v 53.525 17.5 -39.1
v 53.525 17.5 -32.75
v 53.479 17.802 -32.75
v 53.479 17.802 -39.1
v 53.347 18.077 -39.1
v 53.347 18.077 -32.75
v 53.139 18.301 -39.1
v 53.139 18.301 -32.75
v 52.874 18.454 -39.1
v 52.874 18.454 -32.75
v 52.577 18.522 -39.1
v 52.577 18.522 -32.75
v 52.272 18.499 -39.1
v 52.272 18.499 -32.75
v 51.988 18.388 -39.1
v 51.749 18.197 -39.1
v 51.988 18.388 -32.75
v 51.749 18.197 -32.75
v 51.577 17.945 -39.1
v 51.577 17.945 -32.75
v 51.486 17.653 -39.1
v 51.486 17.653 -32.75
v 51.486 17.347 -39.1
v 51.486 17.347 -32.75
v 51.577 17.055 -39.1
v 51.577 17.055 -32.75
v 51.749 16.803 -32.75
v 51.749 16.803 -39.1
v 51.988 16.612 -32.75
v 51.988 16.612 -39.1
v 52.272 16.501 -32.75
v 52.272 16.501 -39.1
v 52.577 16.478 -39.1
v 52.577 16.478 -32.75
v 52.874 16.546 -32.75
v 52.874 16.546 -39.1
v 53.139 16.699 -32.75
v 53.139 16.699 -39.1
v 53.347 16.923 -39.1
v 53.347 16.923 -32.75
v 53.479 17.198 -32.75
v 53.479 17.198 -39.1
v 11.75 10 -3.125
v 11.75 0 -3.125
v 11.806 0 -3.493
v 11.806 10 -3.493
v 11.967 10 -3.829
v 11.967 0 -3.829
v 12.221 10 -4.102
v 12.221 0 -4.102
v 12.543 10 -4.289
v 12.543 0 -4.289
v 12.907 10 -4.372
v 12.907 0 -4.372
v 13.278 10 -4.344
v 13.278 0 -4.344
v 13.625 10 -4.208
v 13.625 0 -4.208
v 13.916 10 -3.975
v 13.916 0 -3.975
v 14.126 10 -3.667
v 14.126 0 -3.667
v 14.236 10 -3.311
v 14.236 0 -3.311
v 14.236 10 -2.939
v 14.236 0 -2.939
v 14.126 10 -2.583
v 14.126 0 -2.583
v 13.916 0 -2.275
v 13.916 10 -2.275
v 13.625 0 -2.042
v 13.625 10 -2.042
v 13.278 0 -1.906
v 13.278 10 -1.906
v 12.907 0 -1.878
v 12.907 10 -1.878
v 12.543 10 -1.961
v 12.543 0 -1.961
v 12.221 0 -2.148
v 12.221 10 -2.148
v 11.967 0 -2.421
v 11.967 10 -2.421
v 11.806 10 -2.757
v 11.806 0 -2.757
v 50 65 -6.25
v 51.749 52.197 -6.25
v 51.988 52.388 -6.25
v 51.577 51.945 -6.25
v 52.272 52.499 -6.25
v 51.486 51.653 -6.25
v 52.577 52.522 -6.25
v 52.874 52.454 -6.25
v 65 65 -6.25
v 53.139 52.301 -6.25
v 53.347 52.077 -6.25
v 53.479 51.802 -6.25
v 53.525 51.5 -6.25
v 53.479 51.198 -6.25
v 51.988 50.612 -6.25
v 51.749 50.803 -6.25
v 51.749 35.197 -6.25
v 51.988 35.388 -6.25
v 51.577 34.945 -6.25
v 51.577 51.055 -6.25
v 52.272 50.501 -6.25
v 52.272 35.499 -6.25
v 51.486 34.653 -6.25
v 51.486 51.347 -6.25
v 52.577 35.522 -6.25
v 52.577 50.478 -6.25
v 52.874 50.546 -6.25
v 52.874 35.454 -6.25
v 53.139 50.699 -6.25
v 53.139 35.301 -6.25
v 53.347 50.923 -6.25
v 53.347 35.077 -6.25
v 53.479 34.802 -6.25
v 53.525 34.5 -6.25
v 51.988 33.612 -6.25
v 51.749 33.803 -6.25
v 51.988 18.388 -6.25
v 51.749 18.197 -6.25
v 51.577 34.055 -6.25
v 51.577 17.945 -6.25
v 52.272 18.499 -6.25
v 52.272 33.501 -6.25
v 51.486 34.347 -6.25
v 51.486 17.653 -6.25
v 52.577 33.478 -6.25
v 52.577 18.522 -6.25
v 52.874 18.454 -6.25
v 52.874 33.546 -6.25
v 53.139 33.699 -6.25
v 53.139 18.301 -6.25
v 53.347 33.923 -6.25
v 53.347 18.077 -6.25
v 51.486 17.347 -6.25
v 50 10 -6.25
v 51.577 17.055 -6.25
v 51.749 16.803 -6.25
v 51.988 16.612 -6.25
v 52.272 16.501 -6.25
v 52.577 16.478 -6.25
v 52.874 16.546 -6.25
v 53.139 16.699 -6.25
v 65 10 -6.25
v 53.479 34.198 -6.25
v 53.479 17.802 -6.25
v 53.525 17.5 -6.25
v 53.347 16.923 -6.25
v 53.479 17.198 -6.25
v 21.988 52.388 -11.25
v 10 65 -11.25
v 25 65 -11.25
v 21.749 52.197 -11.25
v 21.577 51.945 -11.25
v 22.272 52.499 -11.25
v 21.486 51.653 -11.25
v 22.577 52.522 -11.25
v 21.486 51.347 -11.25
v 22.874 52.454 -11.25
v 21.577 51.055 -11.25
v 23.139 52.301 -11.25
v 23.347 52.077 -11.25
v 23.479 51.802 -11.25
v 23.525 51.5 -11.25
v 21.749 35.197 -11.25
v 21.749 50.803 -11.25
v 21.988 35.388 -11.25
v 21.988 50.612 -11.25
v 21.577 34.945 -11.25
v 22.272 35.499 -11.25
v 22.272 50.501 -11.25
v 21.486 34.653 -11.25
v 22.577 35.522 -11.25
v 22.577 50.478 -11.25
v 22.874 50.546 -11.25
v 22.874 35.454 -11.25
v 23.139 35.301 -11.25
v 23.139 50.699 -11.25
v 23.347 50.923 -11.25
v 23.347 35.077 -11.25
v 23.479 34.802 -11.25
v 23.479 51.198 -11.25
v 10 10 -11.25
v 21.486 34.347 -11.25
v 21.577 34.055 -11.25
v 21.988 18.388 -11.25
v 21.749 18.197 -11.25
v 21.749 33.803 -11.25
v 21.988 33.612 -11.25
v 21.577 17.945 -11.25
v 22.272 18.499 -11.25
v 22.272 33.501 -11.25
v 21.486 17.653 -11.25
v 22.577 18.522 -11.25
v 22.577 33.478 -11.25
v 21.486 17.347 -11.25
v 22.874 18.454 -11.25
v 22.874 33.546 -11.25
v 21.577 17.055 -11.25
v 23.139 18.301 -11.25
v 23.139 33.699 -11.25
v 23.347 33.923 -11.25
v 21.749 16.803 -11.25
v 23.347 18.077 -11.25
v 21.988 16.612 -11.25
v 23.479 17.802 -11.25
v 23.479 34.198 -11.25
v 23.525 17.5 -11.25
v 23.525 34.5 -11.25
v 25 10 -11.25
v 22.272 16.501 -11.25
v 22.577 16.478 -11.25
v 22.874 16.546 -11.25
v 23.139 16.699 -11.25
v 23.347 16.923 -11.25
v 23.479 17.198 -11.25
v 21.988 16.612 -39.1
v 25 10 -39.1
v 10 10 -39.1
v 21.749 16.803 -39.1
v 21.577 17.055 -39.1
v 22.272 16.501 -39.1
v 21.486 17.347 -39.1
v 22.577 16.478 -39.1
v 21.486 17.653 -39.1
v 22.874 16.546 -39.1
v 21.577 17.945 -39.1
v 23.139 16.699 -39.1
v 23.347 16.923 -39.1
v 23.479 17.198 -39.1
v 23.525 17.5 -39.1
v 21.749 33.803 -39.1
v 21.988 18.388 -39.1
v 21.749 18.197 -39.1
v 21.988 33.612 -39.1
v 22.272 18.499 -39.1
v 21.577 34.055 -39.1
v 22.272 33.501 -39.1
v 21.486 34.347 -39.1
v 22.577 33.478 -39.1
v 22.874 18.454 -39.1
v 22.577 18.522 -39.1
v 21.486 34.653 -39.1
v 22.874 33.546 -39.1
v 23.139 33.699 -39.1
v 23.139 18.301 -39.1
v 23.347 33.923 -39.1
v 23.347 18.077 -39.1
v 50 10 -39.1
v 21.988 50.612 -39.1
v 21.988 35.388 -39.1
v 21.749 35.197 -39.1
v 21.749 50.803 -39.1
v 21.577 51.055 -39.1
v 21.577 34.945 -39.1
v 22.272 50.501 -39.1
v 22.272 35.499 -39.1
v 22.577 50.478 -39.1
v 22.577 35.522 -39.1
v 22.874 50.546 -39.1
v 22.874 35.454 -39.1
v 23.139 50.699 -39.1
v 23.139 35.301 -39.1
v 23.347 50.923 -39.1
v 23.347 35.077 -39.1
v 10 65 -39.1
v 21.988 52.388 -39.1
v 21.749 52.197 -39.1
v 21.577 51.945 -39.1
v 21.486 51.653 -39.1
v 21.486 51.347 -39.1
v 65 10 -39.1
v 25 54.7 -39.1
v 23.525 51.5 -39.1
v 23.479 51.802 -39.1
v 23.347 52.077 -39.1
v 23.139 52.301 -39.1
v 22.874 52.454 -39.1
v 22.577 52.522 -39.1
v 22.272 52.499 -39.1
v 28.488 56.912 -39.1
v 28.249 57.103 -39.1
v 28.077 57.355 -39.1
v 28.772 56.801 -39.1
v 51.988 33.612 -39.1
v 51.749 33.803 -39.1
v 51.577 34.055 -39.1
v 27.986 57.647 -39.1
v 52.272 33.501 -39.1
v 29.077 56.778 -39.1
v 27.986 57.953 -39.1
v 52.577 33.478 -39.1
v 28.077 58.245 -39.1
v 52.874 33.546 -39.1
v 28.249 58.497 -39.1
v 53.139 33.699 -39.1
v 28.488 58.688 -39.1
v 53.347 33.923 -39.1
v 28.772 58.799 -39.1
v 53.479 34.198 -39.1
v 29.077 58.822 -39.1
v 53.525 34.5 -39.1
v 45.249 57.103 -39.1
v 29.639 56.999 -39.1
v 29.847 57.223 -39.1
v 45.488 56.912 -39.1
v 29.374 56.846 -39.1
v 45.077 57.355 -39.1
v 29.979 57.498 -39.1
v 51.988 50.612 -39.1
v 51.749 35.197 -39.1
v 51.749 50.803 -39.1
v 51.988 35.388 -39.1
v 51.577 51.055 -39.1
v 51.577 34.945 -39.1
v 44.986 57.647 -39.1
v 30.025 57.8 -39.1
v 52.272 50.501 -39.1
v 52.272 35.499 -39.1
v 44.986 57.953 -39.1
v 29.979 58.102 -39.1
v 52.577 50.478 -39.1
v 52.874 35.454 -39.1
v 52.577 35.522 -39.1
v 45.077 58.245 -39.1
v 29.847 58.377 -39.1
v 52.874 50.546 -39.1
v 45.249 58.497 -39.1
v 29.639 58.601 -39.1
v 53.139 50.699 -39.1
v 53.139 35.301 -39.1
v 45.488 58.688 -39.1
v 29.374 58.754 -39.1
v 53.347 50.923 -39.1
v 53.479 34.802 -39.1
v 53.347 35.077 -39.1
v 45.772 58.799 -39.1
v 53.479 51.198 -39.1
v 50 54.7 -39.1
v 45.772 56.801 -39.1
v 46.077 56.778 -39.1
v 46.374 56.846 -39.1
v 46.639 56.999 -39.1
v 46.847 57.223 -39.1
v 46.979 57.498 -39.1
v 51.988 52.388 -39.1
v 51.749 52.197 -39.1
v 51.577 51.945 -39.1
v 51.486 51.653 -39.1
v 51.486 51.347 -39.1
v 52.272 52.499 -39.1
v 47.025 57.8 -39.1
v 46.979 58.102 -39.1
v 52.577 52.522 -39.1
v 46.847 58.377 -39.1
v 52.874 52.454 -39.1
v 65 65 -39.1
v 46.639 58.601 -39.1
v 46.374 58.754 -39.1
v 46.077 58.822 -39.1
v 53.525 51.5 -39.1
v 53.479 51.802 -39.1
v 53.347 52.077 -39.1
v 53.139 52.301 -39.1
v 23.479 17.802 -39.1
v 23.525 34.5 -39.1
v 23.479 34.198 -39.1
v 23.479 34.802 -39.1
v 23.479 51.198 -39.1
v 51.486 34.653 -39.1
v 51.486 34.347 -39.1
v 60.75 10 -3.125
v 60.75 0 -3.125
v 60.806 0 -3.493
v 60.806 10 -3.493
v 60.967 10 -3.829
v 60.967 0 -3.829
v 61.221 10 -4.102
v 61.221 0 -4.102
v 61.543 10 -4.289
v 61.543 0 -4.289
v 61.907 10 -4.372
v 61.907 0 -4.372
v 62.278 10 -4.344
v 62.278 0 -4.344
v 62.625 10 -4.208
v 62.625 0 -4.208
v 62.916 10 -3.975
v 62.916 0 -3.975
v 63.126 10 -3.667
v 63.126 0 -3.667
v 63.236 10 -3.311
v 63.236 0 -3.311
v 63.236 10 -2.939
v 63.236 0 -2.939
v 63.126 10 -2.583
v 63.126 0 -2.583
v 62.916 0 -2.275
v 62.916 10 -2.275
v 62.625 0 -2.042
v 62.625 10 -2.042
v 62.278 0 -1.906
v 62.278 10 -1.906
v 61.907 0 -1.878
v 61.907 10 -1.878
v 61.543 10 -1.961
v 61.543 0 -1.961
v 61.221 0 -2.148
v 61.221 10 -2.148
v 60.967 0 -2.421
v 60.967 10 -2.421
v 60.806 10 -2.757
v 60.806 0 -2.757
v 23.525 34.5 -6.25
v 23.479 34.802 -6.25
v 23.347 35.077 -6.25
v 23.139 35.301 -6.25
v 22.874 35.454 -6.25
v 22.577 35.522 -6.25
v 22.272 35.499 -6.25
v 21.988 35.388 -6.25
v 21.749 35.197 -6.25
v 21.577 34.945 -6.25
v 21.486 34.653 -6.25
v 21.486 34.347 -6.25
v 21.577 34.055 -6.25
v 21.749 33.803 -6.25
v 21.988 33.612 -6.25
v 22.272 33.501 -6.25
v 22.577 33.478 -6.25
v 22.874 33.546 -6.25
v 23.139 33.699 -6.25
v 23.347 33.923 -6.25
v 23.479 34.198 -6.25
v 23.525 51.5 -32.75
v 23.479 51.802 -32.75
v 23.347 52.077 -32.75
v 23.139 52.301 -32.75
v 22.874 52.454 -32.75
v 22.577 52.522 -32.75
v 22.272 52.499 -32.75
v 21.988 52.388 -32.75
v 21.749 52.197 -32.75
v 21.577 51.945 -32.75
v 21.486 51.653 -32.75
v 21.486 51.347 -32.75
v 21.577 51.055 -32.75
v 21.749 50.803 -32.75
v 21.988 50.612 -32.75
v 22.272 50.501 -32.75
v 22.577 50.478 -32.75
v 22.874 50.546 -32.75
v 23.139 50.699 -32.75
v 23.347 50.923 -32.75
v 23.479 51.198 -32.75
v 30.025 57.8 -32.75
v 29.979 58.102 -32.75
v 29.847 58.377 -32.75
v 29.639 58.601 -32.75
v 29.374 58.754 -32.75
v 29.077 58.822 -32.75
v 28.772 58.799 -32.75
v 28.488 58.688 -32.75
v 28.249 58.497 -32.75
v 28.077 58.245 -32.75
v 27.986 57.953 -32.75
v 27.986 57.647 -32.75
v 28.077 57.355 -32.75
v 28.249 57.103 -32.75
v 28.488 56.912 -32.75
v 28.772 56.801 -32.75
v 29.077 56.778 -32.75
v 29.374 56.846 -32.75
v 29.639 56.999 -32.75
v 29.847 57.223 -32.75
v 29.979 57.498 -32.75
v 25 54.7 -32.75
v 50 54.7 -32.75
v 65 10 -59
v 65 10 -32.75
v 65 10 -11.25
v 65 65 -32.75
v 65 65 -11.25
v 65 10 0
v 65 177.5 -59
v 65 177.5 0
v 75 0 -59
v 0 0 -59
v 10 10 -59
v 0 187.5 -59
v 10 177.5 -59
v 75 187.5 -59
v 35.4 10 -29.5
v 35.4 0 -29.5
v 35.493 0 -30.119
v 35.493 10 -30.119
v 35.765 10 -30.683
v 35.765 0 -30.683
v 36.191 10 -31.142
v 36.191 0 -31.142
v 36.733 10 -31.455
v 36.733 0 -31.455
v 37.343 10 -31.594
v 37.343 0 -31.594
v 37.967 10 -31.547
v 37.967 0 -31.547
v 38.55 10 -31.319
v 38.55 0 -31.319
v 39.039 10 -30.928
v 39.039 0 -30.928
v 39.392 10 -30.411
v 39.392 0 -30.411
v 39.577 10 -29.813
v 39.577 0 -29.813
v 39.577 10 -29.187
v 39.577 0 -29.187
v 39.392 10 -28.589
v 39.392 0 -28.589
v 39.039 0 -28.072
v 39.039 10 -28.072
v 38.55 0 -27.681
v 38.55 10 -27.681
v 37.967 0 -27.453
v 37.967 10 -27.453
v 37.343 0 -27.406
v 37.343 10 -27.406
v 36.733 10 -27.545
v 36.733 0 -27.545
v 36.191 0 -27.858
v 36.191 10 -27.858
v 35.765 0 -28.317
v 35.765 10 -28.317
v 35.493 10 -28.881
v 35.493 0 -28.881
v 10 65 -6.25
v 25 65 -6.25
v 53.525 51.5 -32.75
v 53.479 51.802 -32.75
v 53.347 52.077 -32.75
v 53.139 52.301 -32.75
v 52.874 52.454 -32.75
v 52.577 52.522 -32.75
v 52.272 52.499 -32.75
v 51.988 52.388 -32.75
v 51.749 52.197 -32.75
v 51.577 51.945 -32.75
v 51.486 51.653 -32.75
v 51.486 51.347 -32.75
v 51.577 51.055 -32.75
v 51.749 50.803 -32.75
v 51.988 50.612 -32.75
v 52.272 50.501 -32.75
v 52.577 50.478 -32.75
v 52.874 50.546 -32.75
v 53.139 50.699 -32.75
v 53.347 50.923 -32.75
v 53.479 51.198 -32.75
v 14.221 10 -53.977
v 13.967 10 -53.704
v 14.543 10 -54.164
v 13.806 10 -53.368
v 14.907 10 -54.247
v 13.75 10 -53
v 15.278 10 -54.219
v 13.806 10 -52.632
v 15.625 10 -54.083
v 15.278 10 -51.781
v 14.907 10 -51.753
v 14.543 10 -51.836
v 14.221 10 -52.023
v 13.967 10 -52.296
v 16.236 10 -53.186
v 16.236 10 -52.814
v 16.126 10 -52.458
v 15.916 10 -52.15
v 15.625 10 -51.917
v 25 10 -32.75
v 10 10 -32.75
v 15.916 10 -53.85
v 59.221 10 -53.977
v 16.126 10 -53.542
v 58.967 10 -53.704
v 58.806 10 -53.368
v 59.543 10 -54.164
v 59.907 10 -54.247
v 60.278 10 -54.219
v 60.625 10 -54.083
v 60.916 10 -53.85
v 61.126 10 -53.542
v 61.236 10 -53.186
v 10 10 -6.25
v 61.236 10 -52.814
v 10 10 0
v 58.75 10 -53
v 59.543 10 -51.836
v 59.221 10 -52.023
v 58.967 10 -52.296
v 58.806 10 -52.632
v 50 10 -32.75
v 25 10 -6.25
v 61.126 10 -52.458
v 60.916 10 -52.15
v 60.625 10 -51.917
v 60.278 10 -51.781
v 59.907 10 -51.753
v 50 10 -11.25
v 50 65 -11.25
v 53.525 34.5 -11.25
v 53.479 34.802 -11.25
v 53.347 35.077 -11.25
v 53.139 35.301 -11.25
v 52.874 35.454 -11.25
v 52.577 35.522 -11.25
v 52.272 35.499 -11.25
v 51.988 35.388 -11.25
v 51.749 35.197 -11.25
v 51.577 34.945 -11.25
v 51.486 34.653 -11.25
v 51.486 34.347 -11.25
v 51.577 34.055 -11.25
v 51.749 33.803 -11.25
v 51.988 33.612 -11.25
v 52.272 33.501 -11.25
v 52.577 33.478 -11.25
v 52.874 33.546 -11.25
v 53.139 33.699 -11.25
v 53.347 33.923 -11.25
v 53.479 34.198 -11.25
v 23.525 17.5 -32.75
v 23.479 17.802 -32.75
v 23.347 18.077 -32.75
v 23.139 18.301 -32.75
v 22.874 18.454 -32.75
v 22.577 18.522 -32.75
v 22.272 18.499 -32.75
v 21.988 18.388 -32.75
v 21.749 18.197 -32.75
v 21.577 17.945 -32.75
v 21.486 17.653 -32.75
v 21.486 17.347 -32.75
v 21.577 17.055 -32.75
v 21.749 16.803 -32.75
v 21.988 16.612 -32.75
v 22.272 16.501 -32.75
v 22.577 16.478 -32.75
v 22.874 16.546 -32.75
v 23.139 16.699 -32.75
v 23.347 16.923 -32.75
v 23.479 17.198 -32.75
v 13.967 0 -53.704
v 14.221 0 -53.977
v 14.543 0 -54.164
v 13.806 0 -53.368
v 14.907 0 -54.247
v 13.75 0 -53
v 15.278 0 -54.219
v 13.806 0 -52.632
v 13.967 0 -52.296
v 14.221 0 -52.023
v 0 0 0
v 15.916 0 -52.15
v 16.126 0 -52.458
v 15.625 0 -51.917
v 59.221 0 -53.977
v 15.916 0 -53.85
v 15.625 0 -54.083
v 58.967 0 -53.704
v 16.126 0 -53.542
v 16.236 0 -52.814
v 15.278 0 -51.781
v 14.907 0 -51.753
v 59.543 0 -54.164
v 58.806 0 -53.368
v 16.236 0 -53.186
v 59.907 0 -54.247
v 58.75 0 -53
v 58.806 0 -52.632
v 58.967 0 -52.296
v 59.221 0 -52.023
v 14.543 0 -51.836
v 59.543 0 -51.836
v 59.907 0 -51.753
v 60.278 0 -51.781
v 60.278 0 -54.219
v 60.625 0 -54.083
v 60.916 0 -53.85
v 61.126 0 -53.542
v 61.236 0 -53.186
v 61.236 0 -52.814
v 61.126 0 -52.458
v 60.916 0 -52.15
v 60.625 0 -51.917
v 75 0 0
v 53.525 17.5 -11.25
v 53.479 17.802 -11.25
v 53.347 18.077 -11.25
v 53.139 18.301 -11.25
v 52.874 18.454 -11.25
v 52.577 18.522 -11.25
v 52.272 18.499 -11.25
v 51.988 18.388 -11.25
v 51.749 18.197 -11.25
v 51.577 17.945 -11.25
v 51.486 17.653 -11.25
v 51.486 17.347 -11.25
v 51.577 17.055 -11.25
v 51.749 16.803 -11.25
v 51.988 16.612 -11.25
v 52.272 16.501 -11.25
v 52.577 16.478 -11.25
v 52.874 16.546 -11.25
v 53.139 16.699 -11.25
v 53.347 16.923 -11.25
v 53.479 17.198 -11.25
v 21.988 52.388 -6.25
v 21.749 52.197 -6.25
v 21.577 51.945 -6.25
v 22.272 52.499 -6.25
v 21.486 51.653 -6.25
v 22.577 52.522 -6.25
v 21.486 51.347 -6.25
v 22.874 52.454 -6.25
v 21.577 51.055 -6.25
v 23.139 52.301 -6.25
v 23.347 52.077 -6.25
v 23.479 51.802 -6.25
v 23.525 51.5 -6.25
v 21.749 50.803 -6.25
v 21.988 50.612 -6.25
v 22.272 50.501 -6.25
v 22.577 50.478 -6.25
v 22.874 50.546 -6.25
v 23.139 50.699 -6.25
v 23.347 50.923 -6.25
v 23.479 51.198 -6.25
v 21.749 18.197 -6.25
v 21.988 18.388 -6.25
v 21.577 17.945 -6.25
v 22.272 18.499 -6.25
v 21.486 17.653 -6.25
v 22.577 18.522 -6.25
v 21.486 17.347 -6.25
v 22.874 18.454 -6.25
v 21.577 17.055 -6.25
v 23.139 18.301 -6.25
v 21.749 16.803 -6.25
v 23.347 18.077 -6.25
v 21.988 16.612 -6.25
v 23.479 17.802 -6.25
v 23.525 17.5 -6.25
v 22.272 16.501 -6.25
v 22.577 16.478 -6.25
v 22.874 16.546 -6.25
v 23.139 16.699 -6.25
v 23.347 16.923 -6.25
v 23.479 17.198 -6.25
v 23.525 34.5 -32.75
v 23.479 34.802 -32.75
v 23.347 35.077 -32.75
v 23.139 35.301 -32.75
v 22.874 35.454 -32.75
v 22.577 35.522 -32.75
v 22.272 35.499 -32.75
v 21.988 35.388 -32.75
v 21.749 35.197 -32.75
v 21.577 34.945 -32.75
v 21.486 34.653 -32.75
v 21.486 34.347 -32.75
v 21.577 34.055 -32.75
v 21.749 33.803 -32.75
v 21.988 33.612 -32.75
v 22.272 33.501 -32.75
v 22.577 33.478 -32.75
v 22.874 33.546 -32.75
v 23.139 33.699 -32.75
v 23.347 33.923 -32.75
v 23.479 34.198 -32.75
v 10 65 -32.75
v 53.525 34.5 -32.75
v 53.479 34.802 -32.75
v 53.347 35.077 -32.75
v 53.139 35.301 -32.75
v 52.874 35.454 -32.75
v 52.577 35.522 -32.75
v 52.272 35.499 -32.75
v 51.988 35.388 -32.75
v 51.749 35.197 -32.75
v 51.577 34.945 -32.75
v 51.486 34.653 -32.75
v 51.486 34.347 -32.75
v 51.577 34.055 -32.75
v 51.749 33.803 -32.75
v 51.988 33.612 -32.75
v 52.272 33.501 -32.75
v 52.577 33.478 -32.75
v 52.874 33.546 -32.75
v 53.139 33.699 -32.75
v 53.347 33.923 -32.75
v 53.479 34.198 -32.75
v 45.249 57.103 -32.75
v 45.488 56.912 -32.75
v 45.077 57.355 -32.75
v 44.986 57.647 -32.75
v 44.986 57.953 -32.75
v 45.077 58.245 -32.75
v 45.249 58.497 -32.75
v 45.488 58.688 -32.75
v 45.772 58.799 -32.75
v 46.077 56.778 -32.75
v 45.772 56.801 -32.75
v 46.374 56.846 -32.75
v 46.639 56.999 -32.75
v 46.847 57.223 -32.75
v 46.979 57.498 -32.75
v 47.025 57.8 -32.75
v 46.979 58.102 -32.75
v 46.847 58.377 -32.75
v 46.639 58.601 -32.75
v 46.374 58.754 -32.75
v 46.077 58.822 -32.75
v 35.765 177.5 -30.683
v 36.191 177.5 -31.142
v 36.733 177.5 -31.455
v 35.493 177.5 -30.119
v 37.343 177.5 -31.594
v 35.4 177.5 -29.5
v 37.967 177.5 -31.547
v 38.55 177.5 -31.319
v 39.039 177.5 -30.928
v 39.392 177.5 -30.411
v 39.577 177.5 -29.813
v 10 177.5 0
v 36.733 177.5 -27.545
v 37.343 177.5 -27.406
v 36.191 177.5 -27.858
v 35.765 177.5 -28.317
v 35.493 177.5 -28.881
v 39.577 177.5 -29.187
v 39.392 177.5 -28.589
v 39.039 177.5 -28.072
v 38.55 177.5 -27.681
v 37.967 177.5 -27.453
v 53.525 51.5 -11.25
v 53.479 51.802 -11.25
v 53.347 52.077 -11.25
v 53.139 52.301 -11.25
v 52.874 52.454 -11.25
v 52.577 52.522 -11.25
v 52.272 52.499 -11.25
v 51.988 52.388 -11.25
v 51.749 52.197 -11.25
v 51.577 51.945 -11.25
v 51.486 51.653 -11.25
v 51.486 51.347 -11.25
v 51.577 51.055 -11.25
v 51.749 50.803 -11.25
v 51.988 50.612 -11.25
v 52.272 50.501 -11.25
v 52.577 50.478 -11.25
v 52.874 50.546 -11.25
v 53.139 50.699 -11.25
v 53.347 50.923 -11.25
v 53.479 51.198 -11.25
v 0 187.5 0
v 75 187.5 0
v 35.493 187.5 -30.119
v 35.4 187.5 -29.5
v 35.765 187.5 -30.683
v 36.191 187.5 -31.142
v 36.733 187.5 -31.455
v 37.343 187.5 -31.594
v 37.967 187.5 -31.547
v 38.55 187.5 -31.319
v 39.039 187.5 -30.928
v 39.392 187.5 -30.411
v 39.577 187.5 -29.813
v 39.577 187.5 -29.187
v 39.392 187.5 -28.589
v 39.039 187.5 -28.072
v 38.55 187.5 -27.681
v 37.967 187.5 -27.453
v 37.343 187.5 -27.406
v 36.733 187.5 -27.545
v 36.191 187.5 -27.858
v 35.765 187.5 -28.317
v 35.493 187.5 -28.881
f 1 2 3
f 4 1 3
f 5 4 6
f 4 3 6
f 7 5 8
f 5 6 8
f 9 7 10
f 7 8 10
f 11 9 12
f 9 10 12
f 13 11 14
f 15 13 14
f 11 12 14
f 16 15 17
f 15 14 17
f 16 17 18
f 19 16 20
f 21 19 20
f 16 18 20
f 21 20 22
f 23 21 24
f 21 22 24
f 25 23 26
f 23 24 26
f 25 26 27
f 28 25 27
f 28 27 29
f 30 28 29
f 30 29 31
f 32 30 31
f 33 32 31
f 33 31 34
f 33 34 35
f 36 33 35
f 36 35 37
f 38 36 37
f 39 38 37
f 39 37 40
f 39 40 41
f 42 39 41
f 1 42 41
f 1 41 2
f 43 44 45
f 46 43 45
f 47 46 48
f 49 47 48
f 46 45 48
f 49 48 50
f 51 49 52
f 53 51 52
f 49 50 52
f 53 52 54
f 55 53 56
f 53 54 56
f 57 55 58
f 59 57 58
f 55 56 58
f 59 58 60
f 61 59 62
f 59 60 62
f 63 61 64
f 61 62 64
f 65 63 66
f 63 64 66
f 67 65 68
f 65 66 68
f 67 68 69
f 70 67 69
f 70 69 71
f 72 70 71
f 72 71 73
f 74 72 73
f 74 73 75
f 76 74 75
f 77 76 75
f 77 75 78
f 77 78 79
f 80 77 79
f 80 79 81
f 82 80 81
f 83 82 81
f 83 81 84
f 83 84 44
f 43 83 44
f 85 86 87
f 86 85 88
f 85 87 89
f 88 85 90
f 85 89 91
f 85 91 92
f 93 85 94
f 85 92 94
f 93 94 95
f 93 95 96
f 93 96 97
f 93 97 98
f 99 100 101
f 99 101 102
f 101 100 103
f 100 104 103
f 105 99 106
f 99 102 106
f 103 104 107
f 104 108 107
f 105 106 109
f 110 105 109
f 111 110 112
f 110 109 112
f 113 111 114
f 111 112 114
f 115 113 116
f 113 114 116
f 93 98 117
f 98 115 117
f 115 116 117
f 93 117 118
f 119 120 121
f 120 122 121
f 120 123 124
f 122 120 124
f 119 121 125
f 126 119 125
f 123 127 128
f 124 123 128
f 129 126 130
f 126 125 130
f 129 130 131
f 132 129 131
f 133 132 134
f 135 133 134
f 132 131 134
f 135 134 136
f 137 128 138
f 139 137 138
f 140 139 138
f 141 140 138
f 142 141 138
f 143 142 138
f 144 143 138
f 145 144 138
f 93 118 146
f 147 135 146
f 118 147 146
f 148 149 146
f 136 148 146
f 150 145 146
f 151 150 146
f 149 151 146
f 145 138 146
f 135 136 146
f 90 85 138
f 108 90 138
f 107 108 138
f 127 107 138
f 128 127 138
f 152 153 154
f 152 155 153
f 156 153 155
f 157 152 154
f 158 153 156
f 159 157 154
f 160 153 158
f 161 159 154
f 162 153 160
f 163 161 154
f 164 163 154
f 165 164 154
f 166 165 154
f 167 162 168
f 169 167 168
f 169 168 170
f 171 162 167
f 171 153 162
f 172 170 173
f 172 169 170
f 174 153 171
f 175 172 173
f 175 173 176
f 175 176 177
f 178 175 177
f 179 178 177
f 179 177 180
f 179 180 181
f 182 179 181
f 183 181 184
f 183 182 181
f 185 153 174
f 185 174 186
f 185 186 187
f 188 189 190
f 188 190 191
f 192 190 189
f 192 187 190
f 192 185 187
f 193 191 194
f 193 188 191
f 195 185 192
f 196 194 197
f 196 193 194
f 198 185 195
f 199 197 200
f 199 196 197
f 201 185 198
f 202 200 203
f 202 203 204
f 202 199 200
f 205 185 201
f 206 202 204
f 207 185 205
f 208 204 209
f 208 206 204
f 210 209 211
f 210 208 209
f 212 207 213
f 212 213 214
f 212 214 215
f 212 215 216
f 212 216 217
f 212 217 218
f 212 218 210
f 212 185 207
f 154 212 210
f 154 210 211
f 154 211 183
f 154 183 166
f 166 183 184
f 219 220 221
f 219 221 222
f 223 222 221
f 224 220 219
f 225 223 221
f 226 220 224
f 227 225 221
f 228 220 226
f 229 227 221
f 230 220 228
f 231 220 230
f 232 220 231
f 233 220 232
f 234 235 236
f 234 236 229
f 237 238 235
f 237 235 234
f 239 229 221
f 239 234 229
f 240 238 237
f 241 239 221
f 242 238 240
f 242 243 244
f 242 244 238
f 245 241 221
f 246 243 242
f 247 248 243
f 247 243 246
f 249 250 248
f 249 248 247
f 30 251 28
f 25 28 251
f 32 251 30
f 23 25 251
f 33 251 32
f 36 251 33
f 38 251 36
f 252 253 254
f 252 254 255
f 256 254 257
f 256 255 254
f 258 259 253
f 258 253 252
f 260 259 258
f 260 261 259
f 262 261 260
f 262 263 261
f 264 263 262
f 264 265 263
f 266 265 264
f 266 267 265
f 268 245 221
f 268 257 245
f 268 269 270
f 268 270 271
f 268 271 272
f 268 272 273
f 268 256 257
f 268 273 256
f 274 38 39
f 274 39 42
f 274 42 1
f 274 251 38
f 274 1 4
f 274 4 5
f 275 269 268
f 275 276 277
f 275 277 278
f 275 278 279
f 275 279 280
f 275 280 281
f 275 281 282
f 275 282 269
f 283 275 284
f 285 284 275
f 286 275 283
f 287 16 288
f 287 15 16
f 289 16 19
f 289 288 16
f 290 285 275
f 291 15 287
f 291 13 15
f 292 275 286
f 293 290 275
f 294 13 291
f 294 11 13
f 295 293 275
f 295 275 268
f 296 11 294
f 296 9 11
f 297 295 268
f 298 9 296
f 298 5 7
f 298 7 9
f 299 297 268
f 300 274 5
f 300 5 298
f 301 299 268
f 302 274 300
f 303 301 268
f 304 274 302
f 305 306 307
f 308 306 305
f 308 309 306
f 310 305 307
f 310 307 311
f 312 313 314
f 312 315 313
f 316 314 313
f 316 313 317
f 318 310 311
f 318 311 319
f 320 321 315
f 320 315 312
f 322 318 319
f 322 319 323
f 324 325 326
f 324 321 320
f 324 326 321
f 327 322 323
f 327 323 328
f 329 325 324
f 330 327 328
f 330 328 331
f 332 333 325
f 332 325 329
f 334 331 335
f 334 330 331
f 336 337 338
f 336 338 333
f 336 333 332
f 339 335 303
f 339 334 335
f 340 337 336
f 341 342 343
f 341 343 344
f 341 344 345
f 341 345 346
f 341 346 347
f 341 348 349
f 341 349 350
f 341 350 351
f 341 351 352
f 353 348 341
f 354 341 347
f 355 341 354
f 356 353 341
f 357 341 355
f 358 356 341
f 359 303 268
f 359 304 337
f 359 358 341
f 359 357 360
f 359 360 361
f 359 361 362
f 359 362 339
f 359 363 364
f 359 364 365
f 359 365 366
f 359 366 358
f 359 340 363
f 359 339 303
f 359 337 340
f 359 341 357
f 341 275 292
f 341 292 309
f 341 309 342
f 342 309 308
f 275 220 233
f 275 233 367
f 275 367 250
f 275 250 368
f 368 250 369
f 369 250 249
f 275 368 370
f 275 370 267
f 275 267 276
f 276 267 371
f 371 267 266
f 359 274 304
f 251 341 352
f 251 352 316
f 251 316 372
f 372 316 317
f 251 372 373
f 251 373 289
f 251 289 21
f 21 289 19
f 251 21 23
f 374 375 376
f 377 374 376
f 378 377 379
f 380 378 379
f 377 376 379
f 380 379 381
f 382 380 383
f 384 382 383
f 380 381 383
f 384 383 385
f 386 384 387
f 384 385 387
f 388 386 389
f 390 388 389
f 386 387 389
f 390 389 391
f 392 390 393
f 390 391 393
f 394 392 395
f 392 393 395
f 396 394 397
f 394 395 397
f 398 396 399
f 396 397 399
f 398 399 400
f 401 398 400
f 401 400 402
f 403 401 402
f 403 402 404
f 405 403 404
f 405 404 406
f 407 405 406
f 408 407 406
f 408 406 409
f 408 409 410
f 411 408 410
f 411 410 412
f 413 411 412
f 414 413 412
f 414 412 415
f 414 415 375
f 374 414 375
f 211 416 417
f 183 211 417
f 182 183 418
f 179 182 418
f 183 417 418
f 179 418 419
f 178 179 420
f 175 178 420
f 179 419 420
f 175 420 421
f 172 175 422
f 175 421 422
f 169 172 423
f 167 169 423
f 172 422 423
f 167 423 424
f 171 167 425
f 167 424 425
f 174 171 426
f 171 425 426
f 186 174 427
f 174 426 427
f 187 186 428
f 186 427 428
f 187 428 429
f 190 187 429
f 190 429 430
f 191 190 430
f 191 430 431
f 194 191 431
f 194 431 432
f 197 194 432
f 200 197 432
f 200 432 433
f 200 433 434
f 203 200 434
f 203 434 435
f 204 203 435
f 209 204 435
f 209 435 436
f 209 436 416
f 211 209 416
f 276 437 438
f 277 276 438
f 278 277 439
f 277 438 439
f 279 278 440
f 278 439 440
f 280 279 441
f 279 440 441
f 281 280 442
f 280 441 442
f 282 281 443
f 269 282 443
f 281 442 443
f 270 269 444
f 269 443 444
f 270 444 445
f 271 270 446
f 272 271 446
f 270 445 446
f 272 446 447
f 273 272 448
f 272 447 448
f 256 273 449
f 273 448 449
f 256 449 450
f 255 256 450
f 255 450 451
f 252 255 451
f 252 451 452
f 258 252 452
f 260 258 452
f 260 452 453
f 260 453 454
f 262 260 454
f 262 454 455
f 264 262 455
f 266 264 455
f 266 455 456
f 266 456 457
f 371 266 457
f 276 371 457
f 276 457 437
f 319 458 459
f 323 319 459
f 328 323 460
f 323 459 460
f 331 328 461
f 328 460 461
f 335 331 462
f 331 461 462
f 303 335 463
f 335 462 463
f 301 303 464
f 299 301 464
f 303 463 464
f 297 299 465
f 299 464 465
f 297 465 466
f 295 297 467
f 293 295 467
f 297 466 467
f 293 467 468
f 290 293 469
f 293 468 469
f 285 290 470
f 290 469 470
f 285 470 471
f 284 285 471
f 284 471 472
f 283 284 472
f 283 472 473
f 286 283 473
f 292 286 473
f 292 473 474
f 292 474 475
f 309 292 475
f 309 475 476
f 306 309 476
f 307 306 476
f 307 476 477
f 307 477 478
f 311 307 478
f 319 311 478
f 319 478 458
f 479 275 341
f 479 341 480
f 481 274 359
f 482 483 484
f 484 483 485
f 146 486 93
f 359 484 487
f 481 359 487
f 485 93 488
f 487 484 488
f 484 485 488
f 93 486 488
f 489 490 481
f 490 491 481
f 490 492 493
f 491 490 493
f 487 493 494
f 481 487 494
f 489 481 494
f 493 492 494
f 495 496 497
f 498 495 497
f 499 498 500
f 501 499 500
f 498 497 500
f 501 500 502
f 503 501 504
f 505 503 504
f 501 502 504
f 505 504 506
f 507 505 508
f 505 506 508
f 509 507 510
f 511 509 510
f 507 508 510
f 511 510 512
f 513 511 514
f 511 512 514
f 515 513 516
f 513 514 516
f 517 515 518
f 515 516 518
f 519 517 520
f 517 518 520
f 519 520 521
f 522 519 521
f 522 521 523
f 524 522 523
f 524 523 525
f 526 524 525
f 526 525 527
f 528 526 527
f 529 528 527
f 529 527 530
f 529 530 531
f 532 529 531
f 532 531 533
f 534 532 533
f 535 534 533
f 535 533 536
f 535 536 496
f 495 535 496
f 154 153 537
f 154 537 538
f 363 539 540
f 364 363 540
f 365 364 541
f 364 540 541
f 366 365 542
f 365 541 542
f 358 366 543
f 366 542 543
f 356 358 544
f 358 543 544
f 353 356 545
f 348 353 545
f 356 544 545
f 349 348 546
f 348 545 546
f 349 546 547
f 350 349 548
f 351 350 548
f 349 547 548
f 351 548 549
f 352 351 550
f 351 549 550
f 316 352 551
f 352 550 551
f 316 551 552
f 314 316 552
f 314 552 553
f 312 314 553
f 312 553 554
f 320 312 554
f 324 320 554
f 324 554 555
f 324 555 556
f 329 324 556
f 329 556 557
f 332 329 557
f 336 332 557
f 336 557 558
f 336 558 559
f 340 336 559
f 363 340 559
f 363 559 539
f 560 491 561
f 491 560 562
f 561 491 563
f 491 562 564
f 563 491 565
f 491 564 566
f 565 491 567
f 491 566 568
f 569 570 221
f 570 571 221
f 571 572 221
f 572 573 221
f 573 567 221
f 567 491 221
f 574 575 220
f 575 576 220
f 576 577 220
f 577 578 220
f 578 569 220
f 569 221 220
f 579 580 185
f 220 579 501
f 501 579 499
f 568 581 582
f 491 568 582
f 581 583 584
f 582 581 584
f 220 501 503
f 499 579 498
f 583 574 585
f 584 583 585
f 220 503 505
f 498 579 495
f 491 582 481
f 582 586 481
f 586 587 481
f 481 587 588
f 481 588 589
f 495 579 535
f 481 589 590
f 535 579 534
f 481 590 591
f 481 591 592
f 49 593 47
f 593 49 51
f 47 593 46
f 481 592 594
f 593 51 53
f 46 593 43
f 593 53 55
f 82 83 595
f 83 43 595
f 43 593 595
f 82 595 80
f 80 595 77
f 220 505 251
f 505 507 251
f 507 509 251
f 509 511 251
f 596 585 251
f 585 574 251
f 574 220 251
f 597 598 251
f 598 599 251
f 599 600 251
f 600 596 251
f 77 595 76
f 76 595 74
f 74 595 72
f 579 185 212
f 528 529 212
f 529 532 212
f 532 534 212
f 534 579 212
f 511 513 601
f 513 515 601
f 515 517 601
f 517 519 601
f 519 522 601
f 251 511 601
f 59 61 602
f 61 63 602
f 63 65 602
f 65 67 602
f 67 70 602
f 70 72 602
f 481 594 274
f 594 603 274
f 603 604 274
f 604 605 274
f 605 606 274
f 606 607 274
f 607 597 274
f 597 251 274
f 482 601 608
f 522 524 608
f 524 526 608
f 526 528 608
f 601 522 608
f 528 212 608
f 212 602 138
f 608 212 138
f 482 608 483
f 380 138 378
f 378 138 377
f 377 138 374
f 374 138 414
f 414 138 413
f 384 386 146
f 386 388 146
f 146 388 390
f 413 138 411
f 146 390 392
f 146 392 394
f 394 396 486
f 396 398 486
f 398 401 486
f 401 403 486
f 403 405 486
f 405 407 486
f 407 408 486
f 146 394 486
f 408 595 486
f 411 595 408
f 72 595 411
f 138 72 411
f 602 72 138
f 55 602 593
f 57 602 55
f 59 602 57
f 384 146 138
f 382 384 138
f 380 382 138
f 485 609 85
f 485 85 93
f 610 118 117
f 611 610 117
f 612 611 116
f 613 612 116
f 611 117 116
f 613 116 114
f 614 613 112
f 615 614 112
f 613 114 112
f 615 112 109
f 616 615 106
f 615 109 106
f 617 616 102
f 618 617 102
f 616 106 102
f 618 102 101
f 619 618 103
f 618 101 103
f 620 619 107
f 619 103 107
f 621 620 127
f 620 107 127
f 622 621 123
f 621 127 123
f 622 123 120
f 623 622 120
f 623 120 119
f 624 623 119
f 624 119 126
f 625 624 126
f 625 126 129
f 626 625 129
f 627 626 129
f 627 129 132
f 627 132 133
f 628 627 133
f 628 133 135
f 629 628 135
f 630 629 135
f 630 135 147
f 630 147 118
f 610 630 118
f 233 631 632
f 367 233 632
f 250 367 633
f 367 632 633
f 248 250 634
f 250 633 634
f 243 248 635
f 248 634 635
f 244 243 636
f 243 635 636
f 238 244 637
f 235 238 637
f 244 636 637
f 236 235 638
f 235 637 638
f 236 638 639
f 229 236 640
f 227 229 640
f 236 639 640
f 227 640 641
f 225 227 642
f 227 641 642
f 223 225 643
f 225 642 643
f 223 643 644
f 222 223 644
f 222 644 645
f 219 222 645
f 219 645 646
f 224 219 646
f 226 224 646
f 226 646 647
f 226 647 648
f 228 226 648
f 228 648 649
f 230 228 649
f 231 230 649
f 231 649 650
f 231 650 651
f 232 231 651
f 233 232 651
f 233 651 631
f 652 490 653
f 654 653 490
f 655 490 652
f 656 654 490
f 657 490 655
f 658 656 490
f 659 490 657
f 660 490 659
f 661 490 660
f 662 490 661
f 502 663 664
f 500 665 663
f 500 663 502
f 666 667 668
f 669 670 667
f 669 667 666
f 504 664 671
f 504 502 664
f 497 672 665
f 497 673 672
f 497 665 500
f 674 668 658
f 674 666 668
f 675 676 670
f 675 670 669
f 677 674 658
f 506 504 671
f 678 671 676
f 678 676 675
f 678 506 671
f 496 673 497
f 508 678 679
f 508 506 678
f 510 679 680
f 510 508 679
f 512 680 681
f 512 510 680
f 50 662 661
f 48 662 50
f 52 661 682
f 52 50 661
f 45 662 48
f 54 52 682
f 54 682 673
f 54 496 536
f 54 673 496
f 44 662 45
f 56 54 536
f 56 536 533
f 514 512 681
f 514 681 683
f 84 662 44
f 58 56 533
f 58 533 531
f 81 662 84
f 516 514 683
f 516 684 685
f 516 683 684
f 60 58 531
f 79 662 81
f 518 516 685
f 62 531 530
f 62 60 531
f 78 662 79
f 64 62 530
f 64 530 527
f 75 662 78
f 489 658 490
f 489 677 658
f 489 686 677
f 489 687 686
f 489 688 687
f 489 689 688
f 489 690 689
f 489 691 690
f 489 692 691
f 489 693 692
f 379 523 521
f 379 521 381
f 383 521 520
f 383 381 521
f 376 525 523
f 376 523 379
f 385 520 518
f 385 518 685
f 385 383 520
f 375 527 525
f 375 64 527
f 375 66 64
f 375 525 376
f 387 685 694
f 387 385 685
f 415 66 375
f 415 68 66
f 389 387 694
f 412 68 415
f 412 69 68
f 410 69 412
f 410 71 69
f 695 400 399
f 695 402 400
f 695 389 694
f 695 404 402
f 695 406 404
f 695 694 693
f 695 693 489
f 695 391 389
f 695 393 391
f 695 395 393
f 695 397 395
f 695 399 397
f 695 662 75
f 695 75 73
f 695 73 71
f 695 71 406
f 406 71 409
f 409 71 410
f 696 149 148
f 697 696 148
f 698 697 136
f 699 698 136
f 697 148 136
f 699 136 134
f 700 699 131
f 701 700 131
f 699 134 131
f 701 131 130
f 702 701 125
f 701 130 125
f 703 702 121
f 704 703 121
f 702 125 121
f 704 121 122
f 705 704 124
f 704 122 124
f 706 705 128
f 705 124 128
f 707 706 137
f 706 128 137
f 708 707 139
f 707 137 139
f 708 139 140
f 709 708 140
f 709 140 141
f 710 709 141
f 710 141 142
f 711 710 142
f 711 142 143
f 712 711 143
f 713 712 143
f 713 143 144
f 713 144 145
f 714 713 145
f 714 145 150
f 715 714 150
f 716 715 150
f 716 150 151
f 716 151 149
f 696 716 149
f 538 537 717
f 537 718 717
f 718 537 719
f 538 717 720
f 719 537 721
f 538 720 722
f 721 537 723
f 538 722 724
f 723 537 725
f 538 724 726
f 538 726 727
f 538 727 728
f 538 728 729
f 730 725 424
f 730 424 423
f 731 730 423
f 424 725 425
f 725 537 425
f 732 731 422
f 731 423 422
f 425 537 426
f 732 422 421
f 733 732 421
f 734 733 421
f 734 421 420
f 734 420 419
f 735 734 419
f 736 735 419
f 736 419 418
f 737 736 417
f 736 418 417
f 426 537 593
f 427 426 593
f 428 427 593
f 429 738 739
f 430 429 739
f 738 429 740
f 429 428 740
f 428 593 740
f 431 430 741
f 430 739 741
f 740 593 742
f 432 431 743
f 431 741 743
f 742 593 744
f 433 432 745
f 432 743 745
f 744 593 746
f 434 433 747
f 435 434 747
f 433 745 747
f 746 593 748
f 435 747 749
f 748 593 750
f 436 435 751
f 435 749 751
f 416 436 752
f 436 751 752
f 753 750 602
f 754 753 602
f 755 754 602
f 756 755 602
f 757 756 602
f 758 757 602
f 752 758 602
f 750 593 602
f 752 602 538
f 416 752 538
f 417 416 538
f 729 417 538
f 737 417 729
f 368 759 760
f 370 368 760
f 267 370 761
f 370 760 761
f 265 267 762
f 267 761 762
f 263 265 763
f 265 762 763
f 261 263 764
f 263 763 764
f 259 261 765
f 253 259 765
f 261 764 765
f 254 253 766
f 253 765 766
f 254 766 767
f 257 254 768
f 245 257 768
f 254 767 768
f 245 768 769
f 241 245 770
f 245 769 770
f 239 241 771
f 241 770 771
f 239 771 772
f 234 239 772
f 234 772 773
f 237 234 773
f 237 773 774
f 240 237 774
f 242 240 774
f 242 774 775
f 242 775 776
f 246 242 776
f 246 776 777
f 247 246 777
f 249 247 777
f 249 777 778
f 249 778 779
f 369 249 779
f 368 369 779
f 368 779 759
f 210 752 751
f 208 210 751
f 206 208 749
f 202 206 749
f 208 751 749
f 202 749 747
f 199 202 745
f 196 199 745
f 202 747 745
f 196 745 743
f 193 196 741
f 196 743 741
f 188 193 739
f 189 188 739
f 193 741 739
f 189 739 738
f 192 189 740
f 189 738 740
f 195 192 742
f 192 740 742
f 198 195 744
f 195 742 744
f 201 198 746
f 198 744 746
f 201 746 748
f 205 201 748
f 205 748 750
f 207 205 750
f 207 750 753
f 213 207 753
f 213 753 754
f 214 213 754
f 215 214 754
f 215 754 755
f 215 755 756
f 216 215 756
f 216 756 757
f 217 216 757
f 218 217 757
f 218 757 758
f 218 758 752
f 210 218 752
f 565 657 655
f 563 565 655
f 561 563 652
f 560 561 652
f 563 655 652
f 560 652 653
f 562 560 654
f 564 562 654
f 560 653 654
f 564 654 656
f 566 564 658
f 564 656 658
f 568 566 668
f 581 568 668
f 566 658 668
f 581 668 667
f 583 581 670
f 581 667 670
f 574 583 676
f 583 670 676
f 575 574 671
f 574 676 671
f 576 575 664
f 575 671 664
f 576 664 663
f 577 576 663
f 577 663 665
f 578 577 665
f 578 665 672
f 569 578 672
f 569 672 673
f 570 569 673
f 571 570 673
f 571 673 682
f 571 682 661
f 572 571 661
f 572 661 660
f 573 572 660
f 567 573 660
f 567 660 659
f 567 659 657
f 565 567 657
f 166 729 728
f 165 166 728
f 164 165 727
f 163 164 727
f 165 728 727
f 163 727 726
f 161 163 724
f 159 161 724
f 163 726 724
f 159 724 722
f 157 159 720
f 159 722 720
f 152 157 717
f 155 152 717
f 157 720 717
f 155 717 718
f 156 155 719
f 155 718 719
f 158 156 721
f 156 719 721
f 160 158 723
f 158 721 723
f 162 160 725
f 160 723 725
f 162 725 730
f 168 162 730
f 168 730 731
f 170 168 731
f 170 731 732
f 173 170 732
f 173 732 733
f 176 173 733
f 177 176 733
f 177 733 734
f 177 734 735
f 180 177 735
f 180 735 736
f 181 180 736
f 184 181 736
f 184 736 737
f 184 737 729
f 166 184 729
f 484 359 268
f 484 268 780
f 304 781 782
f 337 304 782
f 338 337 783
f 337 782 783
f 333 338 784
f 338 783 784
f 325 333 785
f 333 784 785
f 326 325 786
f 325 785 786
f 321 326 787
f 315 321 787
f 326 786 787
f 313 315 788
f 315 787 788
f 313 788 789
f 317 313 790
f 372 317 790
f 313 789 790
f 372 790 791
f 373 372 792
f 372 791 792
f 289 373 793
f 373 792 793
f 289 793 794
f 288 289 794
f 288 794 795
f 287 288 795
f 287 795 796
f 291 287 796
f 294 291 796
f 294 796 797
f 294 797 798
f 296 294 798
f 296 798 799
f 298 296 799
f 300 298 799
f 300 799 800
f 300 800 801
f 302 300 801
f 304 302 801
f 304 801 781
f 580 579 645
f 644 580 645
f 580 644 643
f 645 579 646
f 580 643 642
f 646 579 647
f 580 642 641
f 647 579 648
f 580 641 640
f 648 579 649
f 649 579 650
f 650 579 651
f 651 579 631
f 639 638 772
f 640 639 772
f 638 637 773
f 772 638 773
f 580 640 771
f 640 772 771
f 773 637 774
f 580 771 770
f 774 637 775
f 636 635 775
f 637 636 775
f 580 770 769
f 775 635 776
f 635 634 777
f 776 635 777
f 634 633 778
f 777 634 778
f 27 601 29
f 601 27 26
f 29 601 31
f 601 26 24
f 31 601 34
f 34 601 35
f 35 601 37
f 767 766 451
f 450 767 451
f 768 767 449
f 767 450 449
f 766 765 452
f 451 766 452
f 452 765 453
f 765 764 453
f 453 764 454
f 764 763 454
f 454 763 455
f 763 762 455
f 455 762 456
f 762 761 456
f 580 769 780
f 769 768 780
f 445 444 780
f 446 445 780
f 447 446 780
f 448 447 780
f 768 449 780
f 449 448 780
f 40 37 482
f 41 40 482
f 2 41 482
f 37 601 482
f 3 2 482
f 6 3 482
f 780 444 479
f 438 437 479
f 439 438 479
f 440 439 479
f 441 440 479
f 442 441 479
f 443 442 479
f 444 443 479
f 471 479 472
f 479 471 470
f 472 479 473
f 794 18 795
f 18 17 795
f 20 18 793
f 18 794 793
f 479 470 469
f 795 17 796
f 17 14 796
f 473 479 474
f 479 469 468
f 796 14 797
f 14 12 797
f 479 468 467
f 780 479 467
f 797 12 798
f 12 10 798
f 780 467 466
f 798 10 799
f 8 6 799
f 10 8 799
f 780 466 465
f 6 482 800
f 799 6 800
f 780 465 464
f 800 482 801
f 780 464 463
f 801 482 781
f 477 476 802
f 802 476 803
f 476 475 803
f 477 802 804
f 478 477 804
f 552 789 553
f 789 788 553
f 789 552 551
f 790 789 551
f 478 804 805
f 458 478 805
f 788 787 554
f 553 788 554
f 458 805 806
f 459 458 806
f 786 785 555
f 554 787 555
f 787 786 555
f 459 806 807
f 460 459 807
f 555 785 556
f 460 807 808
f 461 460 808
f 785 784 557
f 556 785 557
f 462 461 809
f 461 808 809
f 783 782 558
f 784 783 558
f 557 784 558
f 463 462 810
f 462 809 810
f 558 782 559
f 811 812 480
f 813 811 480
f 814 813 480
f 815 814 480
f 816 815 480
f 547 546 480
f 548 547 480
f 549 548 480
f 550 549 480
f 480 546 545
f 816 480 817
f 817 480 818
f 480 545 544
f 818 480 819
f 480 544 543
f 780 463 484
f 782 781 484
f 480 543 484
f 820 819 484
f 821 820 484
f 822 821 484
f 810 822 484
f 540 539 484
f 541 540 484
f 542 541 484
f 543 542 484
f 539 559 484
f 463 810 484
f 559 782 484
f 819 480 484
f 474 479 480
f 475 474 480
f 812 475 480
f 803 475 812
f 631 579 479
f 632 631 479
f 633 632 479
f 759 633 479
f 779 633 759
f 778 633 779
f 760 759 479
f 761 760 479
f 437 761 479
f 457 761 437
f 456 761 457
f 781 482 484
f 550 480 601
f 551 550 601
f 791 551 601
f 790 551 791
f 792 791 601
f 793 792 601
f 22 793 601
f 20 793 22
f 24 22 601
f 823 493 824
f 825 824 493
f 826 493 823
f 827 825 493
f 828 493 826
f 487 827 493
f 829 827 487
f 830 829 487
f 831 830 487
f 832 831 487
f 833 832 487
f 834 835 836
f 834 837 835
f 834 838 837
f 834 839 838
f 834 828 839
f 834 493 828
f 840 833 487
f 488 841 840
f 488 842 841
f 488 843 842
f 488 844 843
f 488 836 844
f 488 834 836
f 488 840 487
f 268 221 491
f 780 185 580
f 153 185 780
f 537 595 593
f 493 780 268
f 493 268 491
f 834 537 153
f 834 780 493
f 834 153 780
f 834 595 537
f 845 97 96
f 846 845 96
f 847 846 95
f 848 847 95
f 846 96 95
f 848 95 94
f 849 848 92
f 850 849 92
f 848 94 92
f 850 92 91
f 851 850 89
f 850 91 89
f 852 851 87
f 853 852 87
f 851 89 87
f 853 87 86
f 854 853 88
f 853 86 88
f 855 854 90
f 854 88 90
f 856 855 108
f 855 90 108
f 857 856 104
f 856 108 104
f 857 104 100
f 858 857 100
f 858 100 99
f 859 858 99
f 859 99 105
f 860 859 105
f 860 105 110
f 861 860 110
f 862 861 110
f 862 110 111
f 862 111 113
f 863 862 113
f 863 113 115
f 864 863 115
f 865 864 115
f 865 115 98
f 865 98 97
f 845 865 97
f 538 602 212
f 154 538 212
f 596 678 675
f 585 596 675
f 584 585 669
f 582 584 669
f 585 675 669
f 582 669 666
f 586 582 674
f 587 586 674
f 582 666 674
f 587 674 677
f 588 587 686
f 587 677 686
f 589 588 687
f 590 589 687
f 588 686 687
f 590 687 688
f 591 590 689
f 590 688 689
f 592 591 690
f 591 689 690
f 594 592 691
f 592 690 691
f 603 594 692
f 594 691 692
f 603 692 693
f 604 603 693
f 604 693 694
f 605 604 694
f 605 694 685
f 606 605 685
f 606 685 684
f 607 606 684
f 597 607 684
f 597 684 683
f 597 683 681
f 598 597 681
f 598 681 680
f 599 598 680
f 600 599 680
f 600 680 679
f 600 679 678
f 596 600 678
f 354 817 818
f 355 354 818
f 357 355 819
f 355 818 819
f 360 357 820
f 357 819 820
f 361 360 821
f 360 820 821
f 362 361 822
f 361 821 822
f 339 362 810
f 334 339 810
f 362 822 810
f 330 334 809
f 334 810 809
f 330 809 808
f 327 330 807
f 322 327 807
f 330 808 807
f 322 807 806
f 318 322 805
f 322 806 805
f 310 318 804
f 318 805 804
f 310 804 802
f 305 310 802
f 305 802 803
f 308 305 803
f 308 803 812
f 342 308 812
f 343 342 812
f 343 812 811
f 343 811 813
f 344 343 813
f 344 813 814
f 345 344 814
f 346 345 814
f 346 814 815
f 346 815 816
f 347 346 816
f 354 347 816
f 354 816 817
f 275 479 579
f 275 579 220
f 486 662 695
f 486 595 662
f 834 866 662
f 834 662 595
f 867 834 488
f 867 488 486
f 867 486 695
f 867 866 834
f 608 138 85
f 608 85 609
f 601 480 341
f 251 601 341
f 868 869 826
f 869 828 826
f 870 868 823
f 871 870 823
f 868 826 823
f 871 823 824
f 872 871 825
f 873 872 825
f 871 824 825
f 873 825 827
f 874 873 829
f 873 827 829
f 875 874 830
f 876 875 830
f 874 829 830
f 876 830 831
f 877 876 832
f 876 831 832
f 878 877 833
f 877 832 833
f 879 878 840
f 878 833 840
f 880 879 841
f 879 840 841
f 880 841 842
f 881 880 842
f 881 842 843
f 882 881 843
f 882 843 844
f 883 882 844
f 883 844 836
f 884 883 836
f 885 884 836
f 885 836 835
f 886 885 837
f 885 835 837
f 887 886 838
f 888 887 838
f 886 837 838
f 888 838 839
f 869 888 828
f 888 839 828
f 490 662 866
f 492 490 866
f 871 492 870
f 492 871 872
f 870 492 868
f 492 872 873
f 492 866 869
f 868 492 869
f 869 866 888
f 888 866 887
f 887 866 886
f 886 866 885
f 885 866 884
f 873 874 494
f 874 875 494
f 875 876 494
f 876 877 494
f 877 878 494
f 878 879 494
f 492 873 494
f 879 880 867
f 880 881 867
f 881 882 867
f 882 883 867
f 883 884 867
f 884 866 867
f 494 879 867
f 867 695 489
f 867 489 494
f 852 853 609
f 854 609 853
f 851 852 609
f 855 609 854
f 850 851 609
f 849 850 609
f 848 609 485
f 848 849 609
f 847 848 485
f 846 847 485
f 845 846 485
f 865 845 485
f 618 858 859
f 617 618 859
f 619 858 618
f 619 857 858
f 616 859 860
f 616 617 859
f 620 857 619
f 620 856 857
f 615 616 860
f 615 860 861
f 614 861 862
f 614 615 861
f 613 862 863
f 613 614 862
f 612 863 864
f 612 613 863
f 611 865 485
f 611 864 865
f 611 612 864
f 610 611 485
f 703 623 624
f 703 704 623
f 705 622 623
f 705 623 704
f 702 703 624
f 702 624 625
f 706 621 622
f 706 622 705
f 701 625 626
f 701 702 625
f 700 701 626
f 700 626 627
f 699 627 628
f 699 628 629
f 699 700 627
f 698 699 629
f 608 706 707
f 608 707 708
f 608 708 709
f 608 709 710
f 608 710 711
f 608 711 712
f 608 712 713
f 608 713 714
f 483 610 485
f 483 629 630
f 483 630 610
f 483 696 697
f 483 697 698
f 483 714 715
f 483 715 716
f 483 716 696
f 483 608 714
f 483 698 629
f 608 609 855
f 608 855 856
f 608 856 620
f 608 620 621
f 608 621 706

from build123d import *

# Parameters (mm, degrees)
SKETCH1_W                       = 75
SKETCH1_H                       = 187.5
SKETCH1_W_2                     = 55
SKETCH1_H_2                     = 167.5
BOSS_EXTRUDE1_DEPTH             = 59
TAP_DRILL_FOR_M5X0_8_TAP2_D     = 4.2
TAP_DRILL_FOR_M5X0_8_TAP2_DEPTH = 10
TAP_DRILL_FOR_M5X0_8_TAP3_D     = 4.2
TAP_DRILL_FOR_M5X0_8_TAP3_DEPTH = 10
TAP_DRILL_FOR_M5X0_8_TAP3_TIP   = 1.2618073
SKETCH13_W                      = 15
SKETCH13_H                      = 6.35
SKETCH13_H_2                    = 5
BOSS_EXTRUDE2_DEPTH             = 55
SKETCH14_W                      = 6.35
SKETCH14_H                      = 10.3
BOSS_EXTRUDE3_DEPTH             = 25
TAP_DRILL_FOR_M2_5X0_45_TAP1_D  = 2.05
TAP_DRILL_FOR_M3X0_5_TAP1_D     = 2.5
TAP_DRILL_FOR_M3X0_5_TAP1_DEPTH = 10


with BuildPart() as part:
    # Sketch1 → Boss-Extrude1 (new body)
    with BuildSketch(Plane.XY):
        with Locations((37.5, 93.75)):
            Rectangle(SKETCH1_W, SKETCH1_H)
        with Locations((37.5, 93.75)):
            Rectangle(SKETCH1_W_2, SKETCH1_H_2, mode=Mode.SUBTRACT)
    extrude(amount=-BOSS_EXTRUDE1_DEPTH)

    # Tap Drill for M5x0.8 Tap2
    with Locations(Plane(origin=(0, 10, 0), x_dir=(1, 0, 0), z_dir=(0, 1, 0))):
        with Locations((37.5, 29.5)):
            Hole(TAP_DRILL_FOR_M5X0_8_TAP2_D / 2, depth=TAP_DRILL_FOR_M5X0_8_TAP2_DEPTH)

    # Tap Drill for M5x0.8 Tap3
    with Locations(Plane(origin=(0, 187.5, 0), x_dir=(1, 0, 0), z_dir=(0, 1, 0))):
        with Locations((37.5, 29.5)):
            Hole(TAP_DRILL_FOR_M5X0_8_TAP3_D / 2, depth=TAP_DRILL_FOR_M5X0_8_TAP3_DEPTH)
            with Locations((0, 0, -(TAP_DRILL_FOR_M5X0_8_TAP3_DEPTH + TAP_DRILL_FOR_M5X0_8_TAP3_TIP / 2))):  # 118° drill point
                Cone(0, TAP_DRILL_FOR_M5X0_8_TAP3_D / 2, TAP_DRILL_FOR_M5X0_8_TAP3_TIP, mode=Mode.SUBTRACT)

    # Sketch13 → Boss-Extrude2 (add)
    with BuildSketch(Plane(origin=(0, 10, 0), x_dir=(1, 0, 0), z_dir=(0, 1, 0))):
        with Locations((57.5, 35.925)):
            Rectangle(SKETCH13_W, SKETCH13_H)
        with Locations((17.5, 35.925)):
            Rectangle(SKETCH13_W, SKETCH13_H)
        with Locations((17.5, 8.75)):
            Rectangle(SKETCH13_W, SKETCH13_H_2)
        with Locations((57.5, 8.75)):
            Rectangle(SKETCH13_W, SKETCH13_H_2)
    extrude(amount=BOSS_EXTRUDE2_DEPTH)

    # Sketch14 → Boss-Extrude3 (add)
    with BuildSketch(Plane.ZY.offset(-50)):
        with Locations((-35.925, 59.85)):
            Rectangle(SKETCH14_W, SKETCH14_H)
    extrude(amount=BOSS_EXTRUDE3_DEPTH)

    # Tap Drill for M2.5x0.45 Tap1 (through all)
    with Locations(Plane(origin=(0, 0, -39.1), x_dir=(-1, 0, 0), z_dir=(0, 0, -1))):
        with Locations((-46, 57.8), (-52.5, 51.5), (-52.5, 34.5), (-52.5, 17.5), (-22.5, 17.5), (-22.5, 34.5), (-22.5, 51.5), (-29, 57.8)):
            Hole(TAP_DRILL_FOR_M2_5X0_45_TAP1_D / 2)

    # Tap Drill for M3x0.5 Tap1
    with Locations(Plane(origin=(0, 10, 0), x_dir=(1, 0, 0), z_dir=(0, 1, 0))):
        with Locations((13, 3.125), (62, 3.125), (60, 53), (15, 53)):
            Hole(TAP_DRILL_FOR_M3X0_5_TAP1_D / 2, depth=TAP_DRILL_FOR_M3X0_5_TAP1_DEPTH)


solid = part.part
